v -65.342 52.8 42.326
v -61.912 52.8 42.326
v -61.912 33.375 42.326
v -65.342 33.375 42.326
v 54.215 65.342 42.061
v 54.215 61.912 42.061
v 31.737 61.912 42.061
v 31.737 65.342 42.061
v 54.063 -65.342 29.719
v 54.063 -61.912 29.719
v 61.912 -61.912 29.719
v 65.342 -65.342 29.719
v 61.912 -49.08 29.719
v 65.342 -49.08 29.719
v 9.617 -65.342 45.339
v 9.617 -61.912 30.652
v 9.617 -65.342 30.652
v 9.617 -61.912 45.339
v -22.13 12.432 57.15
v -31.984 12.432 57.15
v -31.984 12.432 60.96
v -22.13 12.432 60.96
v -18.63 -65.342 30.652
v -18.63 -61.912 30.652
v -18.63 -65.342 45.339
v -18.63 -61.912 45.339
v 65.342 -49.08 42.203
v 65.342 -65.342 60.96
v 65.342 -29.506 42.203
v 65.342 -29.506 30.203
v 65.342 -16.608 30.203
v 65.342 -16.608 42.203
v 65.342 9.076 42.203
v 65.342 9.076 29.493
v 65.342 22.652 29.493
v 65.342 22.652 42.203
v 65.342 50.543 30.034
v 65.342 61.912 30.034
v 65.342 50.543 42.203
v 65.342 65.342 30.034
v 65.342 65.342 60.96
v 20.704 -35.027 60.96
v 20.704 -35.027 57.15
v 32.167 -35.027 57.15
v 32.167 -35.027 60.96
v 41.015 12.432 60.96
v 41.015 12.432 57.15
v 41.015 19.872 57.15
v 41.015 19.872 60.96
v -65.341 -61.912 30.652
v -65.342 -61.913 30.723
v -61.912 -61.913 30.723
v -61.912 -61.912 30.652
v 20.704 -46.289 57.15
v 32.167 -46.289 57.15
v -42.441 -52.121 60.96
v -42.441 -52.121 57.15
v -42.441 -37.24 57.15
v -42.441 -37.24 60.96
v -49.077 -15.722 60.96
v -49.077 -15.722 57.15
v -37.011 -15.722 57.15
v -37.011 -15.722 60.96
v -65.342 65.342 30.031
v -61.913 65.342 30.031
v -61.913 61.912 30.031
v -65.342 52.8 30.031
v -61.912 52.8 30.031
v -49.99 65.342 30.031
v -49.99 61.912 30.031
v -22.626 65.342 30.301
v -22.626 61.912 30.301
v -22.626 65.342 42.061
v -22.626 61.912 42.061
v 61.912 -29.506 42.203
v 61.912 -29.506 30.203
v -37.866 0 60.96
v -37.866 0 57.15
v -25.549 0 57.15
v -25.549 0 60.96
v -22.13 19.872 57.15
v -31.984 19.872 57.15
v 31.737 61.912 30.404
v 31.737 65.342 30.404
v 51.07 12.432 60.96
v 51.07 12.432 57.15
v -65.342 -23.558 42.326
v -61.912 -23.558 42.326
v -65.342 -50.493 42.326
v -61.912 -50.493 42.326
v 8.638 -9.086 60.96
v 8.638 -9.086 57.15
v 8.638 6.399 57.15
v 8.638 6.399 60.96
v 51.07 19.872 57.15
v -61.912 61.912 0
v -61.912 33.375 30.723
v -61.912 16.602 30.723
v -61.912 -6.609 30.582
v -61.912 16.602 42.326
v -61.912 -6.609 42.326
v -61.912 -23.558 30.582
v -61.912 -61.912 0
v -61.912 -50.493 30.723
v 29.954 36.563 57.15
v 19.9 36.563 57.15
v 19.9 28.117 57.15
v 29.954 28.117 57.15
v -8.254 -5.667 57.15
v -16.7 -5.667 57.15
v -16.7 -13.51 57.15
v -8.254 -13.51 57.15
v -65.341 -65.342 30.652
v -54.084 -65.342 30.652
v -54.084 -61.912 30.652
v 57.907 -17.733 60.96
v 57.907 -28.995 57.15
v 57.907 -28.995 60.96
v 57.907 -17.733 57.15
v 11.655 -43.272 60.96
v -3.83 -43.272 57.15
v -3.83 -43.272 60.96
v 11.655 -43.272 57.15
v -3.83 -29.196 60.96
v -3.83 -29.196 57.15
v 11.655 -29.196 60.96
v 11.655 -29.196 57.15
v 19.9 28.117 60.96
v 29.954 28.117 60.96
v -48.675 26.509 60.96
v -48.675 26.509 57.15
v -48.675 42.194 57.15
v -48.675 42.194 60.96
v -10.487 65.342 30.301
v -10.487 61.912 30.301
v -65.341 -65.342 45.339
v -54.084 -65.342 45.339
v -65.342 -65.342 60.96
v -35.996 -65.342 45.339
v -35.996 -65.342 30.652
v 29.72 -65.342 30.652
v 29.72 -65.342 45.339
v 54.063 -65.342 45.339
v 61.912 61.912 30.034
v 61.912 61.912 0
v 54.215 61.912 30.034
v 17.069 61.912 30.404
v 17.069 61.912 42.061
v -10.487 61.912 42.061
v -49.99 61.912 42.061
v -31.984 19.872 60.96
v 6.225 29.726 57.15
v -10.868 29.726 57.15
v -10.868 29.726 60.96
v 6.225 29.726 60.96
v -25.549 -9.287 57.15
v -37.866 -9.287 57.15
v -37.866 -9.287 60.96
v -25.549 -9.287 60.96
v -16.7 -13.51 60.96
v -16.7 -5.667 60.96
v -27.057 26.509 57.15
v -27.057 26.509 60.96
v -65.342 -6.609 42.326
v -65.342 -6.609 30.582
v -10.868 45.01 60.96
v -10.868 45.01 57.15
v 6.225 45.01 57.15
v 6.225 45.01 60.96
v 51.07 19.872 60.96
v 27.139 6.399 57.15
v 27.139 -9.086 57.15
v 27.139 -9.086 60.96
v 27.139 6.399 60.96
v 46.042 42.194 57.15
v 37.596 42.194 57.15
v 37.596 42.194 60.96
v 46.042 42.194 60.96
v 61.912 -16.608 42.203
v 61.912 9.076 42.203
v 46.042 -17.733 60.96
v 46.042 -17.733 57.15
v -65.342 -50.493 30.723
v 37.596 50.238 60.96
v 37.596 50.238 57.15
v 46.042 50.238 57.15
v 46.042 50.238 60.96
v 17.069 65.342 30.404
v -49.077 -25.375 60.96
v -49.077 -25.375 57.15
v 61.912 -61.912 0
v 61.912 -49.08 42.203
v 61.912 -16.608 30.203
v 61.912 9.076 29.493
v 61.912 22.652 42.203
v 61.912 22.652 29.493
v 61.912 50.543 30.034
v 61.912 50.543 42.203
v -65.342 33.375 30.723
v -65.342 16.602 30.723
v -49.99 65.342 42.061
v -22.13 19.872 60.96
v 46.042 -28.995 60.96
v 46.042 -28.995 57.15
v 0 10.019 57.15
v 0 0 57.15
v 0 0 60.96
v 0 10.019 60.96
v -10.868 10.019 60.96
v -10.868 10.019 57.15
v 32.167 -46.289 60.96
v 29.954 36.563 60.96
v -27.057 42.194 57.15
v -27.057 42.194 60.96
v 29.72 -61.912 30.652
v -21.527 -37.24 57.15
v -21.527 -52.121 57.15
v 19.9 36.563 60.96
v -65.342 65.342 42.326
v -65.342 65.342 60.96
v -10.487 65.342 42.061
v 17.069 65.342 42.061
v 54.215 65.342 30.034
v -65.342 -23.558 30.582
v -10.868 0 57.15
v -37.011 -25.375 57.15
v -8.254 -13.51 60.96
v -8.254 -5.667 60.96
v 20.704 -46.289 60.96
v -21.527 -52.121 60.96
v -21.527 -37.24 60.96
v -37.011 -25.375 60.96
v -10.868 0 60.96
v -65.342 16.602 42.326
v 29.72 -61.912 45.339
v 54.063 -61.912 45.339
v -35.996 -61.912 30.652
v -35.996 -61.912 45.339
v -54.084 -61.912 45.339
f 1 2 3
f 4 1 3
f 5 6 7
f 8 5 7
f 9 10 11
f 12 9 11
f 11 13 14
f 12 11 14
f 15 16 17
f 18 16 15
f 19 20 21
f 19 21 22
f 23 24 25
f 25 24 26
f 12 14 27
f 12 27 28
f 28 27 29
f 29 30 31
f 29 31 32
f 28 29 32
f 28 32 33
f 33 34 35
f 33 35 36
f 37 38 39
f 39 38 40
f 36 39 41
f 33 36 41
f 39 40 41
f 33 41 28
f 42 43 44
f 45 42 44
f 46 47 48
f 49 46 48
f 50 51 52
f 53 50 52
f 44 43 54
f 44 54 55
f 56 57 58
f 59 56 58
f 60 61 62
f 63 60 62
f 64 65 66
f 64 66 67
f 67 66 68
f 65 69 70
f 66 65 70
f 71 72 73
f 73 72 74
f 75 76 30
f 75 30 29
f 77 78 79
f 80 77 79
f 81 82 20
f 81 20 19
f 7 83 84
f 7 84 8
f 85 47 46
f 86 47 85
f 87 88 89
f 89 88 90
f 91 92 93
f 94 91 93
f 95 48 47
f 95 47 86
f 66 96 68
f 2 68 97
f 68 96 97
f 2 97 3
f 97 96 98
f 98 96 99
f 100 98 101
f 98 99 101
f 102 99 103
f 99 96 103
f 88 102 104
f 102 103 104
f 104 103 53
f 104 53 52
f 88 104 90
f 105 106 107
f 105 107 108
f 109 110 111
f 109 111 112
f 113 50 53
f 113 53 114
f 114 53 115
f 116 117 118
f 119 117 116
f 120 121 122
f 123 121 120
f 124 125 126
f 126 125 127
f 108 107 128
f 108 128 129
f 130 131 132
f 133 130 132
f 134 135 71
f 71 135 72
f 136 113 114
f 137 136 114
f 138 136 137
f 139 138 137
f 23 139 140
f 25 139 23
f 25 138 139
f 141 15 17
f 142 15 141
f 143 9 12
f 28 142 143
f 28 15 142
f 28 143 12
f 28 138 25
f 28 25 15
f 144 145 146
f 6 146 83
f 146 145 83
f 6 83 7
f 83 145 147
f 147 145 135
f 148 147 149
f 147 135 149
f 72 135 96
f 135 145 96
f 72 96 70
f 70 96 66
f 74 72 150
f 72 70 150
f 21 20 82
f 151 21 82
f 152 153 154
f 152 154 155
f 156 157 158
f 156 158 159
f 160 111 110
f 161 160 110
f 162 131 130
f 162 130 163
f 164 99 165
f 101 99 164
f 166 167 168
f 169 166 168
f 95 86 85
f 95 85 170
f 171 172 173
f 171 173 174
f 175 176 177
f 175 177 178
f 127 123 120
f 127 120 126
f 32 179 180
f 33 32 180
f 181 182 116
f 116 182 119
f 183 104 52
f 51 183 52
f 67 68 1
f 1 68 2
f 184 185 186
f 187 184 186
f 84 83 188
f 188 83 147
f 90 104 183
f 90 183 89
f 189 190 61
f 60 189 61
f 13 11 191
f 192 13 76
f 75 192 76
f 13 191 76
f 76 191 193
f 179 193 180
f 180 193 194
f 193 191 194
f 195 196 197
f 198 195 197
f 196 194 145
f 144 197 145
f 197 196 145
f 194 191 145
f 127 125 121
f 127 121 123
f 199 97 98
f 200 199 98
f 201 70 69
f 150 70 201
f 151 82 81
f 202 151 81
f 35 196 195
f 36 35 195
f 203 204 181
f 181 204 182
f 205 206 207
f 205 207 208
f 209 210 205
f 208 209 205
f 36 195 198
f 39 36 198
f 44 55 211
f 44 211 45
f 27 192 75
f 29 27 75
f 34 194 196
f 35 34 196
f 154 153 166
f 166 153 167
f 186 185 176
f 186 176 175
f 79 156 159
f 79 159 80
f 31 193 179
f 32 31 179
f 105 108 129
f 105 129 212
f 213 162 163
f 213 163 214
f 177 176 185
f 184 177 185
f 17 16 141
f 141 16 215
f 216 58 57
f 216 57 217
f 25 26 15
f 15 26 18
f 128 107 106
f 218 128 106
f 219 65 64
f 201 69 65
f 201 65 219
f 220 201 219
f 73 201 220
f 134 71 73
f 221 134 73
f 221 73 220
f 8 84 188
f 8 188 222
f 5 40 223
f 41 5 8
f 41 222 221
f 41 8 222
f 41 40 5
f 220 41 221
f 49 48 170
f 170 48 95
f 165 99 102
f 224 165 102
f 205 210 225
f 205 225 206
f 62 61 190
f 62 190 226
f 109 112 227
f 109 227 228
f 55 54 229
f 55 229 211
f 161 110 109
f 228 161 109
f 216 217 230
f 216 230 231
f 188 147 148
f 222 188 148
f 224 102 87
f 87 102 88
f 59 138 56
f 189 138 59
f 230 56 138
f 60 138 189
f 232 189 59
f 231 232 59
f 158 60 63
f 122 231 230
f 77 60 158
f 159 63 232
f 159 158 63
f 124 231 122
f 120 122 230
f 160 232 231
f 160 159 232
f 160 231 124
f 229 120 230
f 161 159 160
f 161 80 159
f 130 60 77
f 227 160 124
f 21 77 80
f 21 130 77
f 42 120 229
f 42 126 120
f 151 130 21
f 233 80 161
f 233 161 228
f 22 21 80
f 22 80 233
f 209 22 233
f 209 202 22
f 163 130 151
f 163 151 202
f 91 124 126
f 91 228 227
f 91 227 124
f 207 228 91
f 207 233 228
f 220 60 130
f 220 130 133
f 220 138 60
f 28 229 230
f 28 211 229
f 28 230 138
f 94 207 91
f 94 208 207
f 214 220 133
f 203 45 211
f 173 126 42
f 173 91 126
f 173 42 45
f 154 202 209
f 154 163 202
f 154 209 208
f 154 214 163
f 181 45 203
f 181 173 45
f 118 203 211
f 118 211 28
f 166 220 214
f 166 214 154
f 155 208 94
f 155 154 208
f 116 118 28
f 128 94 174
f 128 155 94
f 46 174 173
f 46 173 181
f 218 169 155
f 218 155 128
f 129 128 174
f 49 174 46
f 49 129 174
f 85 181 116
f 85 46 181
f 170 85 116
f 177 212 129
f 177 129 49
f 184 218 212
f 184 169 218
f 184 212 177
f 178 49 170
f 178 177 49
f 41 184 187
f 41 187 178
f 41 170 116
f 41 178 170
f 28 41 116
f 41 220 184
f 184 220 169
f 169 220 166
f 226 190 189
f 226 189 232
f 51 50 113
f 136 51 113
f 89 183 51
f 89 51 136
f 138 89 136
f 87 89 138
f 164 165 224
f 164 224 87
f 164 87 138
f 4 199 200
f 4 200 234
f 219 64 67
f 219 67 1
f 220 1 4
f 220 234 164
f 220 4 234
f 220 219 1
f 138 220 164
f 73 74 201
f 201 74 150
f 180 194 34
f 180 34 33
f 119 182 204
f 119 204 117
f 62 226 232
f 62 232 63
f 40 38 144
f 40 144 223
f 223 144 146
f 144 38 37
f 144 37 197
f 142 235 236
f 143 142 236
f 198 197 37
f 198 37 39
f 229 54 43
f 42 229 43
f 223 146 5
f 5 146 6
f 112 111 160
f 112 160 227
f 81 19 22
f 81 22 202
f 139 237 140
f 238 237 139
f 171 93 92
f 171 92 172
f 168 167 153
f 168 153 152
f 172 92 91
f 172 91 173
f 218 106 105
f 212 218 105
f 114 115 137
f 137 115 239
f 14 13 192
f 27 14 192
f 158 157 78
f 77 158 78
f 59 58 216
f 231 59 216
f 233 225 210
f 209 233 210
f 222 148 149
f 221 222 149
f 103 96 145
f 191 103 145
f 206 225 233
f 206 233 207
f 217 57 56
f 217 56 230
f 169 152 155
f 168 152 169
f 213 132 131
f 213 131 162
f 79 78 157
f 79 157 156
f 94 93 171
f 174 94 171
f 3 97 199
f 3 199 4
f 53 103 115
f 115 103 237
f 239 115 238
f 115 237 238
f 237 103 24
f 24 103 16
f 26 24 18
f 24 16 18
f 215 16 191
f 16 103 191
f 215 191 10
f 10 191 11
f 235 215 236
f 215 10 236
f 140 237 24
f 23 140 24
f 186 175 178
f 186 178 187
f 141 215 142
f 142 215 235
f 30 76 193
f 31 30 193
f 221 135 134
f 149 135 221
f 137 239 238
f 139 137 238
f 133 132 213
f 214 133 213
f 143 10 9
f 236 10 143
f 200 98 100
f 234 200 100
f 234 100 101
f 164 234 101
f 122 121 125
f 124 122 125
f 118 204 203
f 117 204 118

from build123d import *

# Parameters (mm, degrees)
F0_W      = 82.55
F0_H      = 82.55
F1_DEPTH  = 38.1
F2_W      = 82.55
F2_H      = 82.55
F2_W_2    = 13.9428069815
F2_H_2    = 9.9208420143
F2_W_3    = 8.0439243466
F2_H_3    = 6.4351418987
F2_W_4    = 8.2115095574
F2_H_4    = 6.1912699603
F2_W_5    = 5.6307478808
F2_H_5    = 5.2285513375
F2_W_6    = 10.3230390232
F2_H_6    = 9.3845799565
F2_W_7    = 7.6417308301
F2_H_7    = 7.5076650828
F2_W_8    = 12.3340208083
F2_H_8    = 10.3230387904
F2_W_9    = 7.9098585993
F2_H_9    = 7.5076660141
F2_W_10   = 7.2456169873
F2_H_10   = 6.6790115088
F2_W_11   = 6.5692057833
F2_H_11   = 4.9604205415
F2_W_12   = 14.4120394252
F2_H_12   = 10.4571059346
F2_W_13   = 11.3955624402
F2_H_13   = 10.1889744401
F2_W_14   = 6.7032724619
F2_H_14   = 5.6307483464
F2_W_15   = 5.6307520717
F2_H_15   = 5.3626168519
F3_DEPTH  = 2.54
F4_W      = 82.55
F4_H      = 12.5048903072
F5_DEPTH  = 2.286
F6_W      = 8.554907316
F6_H      = 8.3226170391
F7_DEPTH  = 2.286
F8_W      = 8.5991304368
F8_H      = 7.9995281994
F9_DEPTH  = 2.286
F10_W     = 9.0507952429
F10_H     = 8.4728021175
F11_DEPTH = 2.286
F12_W     = 7.5796225905
F12_H     = 8.1127006561
F13_DEPTH = 2.286
F14_W     = 84.836
F14_H     = 12.5993990594
F15_DEPTH = 2.286
F16_W     = 5.275822799
F16_H     = 8.0181919038
F17_DEPTH = 2.286
F18_W     = 2.1420419216
F18_H     = 8.0181919038
F19_DEPTH = 2.286
F20_W     = 9.7789997235
F20_H     = 7.7714007348
F21_DEPTH = 2.286
F22_W     = 8.092913311
F22_H     = 7.8396778554
F23_DEPTH = 2.286
F24_W     = 7.9482773185
F24_H     = 8.0201905221
F25_DEPTH = 2.286
F26_W     = 84.836
F26_H     = 12.4227774584
F27_DEPTH = 2.286
F28_W     = 5.6573223279
F28_H     = 8.1968121231
F29_DEPTH = 2.286
F30_W     = 2.7038902044
F30_H     = 8.1968121231
F31_DEPTH = 2.286
F32_W     = 11.1818928272
F32_H     = 7.734913379
F33_DEPTH = 2.286
F34_W     = 11.2993712537
F34_H     = 7.8291036189
F35_DEPTH = 2.286
F36_W     = 7.6127404213
F36_H     = 7.734913379
F37_DEPTH = 2.286
F38_W     = 87.122
F38_H     = 10.4137536731
F39_DEPTH = 2.286
F40_W     = 4.9288716123
F40_H     = 9.7913470712
F40_W_2   = 2.5759153068
F41_DEPTH = 2.286
F42_W     = 11.5772541612
F42_H     = 9.7913470712
F43_DEPTH = 2.286
F44_W     = 13.4015749209
F44_H     = 9.7913470712
F45_DEPTH = 2.286
F46_W     = 7.5191628144
F46_H     = 10.4137536731
F47_DEPTH = 2.286
F48_SCALE = 1.5


with BuildPart() as f1:
    # F0 (on Top) → F1 (new body)
    with BuildSketch(Plane.XY):
        Rectangle(F0_W, F0_H)
    extrude(amount=F1_DEPTH)

    # F2 (on face) → F3 (join)
    with BuildSketch(Plane.XY.offset(38.1)):
        Rectangle(F2_W, F2_H)
        with Locations((-21.3224873878, -29.7867883928)):
            Rectangle(F2_W_2, F2_H_2, mode=Mode.SUBTRACT)
        with Locations((-28.6960853264, -13.6989350431)):
            Rectangle(F2_W_3, F2_H_3, mode=Mode.SUBTRACT)
        with Locations((-21.1381489644, -3.0956349801)):
            Rectangle(F2_W_4, F2_H_4, mode=Mode.SUBTRACT)
        with Locations((-8.3181404043, -6.3923679991)):
            Rectangle(F2_W_5, F2_H_5, mode=Mode.SUBTRACT)
        with Locations((2.6081927354, -24.1560377181)):
            Rectangle(F2_W_6, F2_H_6, mode=Mode.SUBTRACT)
        with Locations((17.6235223189, -27.1054795012)):
            Rectangle(F2_W_7, F2_H_7, mode=Mode.SUBTRACT)
        with Locations((11.9257410988, -0.8956852835)):
            Rectangle(F2_W_8, F2_H_8, mode=Mode.SUBTRACT)
        with Locations((34.6498331055, -15.5758508481)):
            Rectangle(F2_W_9, F2_H_9, mode=Mode.SUBTRACT)
        with Locations((-3.6228084937, 3.3395057544)):
            Rectangle(F2_W_10, F2_H_10, mode=Mode.SUBTRACT)
        with Locations((-18.0378840305, 10.7680070214)):
            Rectangle(F2_W_11, F2_H_11, mode=Mode.SUBTRACT)
        with Locations((-25.2439037431, 22.9009296745)):
            Rectangle(F2_W_12, F2_H_12, mode=Mode.SUBTRACT)
        with Locations((-1.5478357673, 24.9119121581)):
            Rectangle(F2_W_13, F2_H_13, mode=Mode.SUBTRACT)
        with Locations((30.6949019432, 10.7680070214)):
            Rectangle(F2_W_14, F2_H_11, mode=Mode.SUBTRACT)
        with Locations((16.6180301458, 21.5602749959)):
            Rectangle(F2_W_14, F2_H_14, mode=Mode.SUBTRACT)
        with Locations((27.87952777, 30.8107910678)):
            Rectangle(F2_W_15, F2_H_15, mode=Mode.SUBTRACT)
    extrude(amount=F3_DEPTH)

    # F4 (on face) → F5 (join)
    with BuildSketch(Plane.YZ.offset(41.275)):
        with Locations((0, 34.3875548464)):
            Rectangle(F4_W, F4_H)
    extrude(amount=F5_DEPTH)

    # F6 (on face) → F7 (join)
    with BuildSketch(Plane.YZ.offset(41.275)):
        with Locations((-36.997546342, 23.9738011733)):
            Rectangle(F6_W, F6_H)
    extrude(amount=F7_DEPTH)

    # F8 (on face) → F9 (join)
    with BuildSketch(Plane.YZ.offset(41.275)):
        with Locations((-15.3713310137, 24.1353455931)):
            Rectangle(F8_W, F8_H)
    extrude(amount=F9_DEPTH)

    # F10 (on face) → F11 (join)
    with BuildSketch(Plane.YZ.offset(41.275)):
        with Locations((10.5762194809, 23.8987086341)):
            Rectangle(F10_W, F10_H)
    extrude(amount=F11_DEPTH)

    # F12 (on face) → F13 (join)
    with BuildSketch(Plane.YZ.offset(41.275)):
        with Locations((37.4851887047, 24.0787593648)):
            Rectangle(F12_W, F12_H)
    extrude(amount=F13_DEPTH)

    # F14 (on face) → F15 (join)
    with BuildSketch(Plane(origin=(0, 41.275, 0), x_dir=(-1, 0, 0), z_dir=(0, 1, 0))):
        with Locations((-1.143, 34.3403004703)):
            Rectangle(F14_W, F14_H)
    extrude(amount=F15_DEPTH)

    # F16 (on face) → F17 (join)
    with BuildSketch(Plane(origin=(0, 41.275, 0), x_dir=(-1, 0, 0), z_dir=(0, 1, 0))):
        with Locations((-40.9230886005, 24.0315049887)):
            Rectangle(F16_W, F16_H)
    extrude(amount=F17_DEPTH)

    # F18 (on face) → F19 (join)
    with BuildSketch(Plane(origin=(0, 41.275, 0), x_dir=(-1, 0, 0), z_dir=(0, 1, 0))):
        with Locations((-37.2141562402, 24.0315049887)):
            Rectangle(F18_W, F18_H)
    extrude(amount=F19_DEPTH)

    # F20 (on face) → F21 (join)
    with BuildSketch(Plane(origin=(0, 41.275, 0), x_dir=(-1, 0, 0), z_dir=(0, 1, 0))):
        with Locations((-16.2686998956, 24.1549005732)):
            Rectangle(F20_W, F20_H)
    extrude(amount=F21_DEPTH)

    # F22 (on face) → F23 (join)
    with BuildSketch(Plane(origin=(0, 41.275, 0), x_dir=(-1, 0, 0), z_dir=(0, 1, 0))):
        with Locations((11.0376609955, 24.1207620129)):
            Rectangle(F22_W, F22_H)
    extrude(amount=F23_DEPTH)

    # F24 (on face) → F25 (join)
    with BuildSketch(Plane(origin=(0, 41.275, 0), x_dir=(-1, 0, 0), z_dir=(0, 1, 0))):
        with Locations((37.3008613408, 24.0305056795)):
            Rectangle(F24_W, F24_H)
    extrude(amount=F25_DEPTH)

    # F26 (on face) → F27 (join)
    with BuildSketch(Plane(origin=(-41.275, 0, 0), x_dir=(0, -1, 0), z_dir=(-1, 0, 0))):
        with Locations((-1.143, 34.4286112708)):
            Rectangle(F26_W, F26_H)
    extrude(amount=F27_DEPTH)

    # F28 (on face) → F29 (join)
    with BuildSketch(Plane(origin=(-41.275, 0, 0), x_dir=(0, -1, 0), z_dir=(-1, 0, 0))):
        with Locations((-40.7323388361, 24.11881648)):
            Rectangle(F28_W, F28_H)
    extrude(amount=F29_DEPTH)

    # F30 (on face) → F31 (join)
    with BuildSketch(Plane(origin=(-41.275, 0, 0), x_dir=(0, -1, 0), z_dir=(-1, 0, 0))):
        with Locations((-36.5517325699, 24.11881648)):
            Rectangle(F30_W, F30_H)
    extrude(amount=F31_DEPTH)

    # F32 (on face) → F33 (join)
    with BuildSketch(Plane(origin=(-41.275, 0, 0), x_dir=(0, -1, 0), z_dir=(-1, 0, 0))):
        with Locations((-16.6591824964, 24.3497658521)):
            Rectangle(F32_W, F32_H)
    extrude(amount=F33_DEPTH)

    # F34 (on face) → F35 (join)
    with BuildSketch(Plane(origin=(-41.275, 0, 0), x_dir=(0, -1, 0), z_dir=(-1, 0, 0))):
        with Locations((10.0554807577, 24.3026707321)):
            Rectangle(F34_W, F34_H)
    extrude(amount=F35_DEPTH)

    # F36 (on face) → F37 (join)
    with BuildSketch(Plane(origin=(-41.275, 0, 0), x_dir=(0, -1, 0), z_dir=(-1, 0, 0))):
        with Locations((37.4686297894, 24.3497658521)):
            Rectangle(F36_W, F36_H)
    extrude(amount=F37_DEPTH)

    # F38 (on face) → F39 (join)
    with BuildSketch(Plane.XZ.offset(41.275)):
        with Locations((0, 35.4331231634)):
            Rectangle(F38_W, F38_H)
    extrude(amount=F39_DEPTH)

    # F40 (on face) → F41 (join)
    with BuildSketch(Plane.XZ.offset(41.275)):
        with Locations((-41.0965641938, 25.3305727912)):
            Rectangle(F40_W, F40_H)
        with Locations((-37.3441707343, 25.3305727912)):
            Rectangle(F40_W_2, F40_H)
    extrude(amount=F41_DEPTH)

    # F42 (on face) → F43 (join)
    with BuildSketch(Plane.XZ.offset(41.275)):
        with Locations((-18.2089535519, 25.3305727912)):
            Rectangle(F42_W, F42_H)
    extrude(amount=F43_DEPTH)

    # F44 (on face) → F45 (join)
    with BuildSketch(Plane.XZ.offset(41.275)):
        with Locations((13.1122844759, 25.3305727912)):
            Rectangle(F44_W, F44_H)
    extrude(amount=F45_DEPTH)

    # F46 (on face) → F47 (join)
    with BuildSketch(Plane.XZ.offset(41.275)):
        with Locations((39.8014185928, 25.0193694903)):
            Rectangle(F46_W, F46_H)
    extrude(amount=F47_DEPTH)


with BuildPart() as f1_1:
    # F48: moved
    add(f1.part.scale(F48_SCALE))


solid = f1_1.part
